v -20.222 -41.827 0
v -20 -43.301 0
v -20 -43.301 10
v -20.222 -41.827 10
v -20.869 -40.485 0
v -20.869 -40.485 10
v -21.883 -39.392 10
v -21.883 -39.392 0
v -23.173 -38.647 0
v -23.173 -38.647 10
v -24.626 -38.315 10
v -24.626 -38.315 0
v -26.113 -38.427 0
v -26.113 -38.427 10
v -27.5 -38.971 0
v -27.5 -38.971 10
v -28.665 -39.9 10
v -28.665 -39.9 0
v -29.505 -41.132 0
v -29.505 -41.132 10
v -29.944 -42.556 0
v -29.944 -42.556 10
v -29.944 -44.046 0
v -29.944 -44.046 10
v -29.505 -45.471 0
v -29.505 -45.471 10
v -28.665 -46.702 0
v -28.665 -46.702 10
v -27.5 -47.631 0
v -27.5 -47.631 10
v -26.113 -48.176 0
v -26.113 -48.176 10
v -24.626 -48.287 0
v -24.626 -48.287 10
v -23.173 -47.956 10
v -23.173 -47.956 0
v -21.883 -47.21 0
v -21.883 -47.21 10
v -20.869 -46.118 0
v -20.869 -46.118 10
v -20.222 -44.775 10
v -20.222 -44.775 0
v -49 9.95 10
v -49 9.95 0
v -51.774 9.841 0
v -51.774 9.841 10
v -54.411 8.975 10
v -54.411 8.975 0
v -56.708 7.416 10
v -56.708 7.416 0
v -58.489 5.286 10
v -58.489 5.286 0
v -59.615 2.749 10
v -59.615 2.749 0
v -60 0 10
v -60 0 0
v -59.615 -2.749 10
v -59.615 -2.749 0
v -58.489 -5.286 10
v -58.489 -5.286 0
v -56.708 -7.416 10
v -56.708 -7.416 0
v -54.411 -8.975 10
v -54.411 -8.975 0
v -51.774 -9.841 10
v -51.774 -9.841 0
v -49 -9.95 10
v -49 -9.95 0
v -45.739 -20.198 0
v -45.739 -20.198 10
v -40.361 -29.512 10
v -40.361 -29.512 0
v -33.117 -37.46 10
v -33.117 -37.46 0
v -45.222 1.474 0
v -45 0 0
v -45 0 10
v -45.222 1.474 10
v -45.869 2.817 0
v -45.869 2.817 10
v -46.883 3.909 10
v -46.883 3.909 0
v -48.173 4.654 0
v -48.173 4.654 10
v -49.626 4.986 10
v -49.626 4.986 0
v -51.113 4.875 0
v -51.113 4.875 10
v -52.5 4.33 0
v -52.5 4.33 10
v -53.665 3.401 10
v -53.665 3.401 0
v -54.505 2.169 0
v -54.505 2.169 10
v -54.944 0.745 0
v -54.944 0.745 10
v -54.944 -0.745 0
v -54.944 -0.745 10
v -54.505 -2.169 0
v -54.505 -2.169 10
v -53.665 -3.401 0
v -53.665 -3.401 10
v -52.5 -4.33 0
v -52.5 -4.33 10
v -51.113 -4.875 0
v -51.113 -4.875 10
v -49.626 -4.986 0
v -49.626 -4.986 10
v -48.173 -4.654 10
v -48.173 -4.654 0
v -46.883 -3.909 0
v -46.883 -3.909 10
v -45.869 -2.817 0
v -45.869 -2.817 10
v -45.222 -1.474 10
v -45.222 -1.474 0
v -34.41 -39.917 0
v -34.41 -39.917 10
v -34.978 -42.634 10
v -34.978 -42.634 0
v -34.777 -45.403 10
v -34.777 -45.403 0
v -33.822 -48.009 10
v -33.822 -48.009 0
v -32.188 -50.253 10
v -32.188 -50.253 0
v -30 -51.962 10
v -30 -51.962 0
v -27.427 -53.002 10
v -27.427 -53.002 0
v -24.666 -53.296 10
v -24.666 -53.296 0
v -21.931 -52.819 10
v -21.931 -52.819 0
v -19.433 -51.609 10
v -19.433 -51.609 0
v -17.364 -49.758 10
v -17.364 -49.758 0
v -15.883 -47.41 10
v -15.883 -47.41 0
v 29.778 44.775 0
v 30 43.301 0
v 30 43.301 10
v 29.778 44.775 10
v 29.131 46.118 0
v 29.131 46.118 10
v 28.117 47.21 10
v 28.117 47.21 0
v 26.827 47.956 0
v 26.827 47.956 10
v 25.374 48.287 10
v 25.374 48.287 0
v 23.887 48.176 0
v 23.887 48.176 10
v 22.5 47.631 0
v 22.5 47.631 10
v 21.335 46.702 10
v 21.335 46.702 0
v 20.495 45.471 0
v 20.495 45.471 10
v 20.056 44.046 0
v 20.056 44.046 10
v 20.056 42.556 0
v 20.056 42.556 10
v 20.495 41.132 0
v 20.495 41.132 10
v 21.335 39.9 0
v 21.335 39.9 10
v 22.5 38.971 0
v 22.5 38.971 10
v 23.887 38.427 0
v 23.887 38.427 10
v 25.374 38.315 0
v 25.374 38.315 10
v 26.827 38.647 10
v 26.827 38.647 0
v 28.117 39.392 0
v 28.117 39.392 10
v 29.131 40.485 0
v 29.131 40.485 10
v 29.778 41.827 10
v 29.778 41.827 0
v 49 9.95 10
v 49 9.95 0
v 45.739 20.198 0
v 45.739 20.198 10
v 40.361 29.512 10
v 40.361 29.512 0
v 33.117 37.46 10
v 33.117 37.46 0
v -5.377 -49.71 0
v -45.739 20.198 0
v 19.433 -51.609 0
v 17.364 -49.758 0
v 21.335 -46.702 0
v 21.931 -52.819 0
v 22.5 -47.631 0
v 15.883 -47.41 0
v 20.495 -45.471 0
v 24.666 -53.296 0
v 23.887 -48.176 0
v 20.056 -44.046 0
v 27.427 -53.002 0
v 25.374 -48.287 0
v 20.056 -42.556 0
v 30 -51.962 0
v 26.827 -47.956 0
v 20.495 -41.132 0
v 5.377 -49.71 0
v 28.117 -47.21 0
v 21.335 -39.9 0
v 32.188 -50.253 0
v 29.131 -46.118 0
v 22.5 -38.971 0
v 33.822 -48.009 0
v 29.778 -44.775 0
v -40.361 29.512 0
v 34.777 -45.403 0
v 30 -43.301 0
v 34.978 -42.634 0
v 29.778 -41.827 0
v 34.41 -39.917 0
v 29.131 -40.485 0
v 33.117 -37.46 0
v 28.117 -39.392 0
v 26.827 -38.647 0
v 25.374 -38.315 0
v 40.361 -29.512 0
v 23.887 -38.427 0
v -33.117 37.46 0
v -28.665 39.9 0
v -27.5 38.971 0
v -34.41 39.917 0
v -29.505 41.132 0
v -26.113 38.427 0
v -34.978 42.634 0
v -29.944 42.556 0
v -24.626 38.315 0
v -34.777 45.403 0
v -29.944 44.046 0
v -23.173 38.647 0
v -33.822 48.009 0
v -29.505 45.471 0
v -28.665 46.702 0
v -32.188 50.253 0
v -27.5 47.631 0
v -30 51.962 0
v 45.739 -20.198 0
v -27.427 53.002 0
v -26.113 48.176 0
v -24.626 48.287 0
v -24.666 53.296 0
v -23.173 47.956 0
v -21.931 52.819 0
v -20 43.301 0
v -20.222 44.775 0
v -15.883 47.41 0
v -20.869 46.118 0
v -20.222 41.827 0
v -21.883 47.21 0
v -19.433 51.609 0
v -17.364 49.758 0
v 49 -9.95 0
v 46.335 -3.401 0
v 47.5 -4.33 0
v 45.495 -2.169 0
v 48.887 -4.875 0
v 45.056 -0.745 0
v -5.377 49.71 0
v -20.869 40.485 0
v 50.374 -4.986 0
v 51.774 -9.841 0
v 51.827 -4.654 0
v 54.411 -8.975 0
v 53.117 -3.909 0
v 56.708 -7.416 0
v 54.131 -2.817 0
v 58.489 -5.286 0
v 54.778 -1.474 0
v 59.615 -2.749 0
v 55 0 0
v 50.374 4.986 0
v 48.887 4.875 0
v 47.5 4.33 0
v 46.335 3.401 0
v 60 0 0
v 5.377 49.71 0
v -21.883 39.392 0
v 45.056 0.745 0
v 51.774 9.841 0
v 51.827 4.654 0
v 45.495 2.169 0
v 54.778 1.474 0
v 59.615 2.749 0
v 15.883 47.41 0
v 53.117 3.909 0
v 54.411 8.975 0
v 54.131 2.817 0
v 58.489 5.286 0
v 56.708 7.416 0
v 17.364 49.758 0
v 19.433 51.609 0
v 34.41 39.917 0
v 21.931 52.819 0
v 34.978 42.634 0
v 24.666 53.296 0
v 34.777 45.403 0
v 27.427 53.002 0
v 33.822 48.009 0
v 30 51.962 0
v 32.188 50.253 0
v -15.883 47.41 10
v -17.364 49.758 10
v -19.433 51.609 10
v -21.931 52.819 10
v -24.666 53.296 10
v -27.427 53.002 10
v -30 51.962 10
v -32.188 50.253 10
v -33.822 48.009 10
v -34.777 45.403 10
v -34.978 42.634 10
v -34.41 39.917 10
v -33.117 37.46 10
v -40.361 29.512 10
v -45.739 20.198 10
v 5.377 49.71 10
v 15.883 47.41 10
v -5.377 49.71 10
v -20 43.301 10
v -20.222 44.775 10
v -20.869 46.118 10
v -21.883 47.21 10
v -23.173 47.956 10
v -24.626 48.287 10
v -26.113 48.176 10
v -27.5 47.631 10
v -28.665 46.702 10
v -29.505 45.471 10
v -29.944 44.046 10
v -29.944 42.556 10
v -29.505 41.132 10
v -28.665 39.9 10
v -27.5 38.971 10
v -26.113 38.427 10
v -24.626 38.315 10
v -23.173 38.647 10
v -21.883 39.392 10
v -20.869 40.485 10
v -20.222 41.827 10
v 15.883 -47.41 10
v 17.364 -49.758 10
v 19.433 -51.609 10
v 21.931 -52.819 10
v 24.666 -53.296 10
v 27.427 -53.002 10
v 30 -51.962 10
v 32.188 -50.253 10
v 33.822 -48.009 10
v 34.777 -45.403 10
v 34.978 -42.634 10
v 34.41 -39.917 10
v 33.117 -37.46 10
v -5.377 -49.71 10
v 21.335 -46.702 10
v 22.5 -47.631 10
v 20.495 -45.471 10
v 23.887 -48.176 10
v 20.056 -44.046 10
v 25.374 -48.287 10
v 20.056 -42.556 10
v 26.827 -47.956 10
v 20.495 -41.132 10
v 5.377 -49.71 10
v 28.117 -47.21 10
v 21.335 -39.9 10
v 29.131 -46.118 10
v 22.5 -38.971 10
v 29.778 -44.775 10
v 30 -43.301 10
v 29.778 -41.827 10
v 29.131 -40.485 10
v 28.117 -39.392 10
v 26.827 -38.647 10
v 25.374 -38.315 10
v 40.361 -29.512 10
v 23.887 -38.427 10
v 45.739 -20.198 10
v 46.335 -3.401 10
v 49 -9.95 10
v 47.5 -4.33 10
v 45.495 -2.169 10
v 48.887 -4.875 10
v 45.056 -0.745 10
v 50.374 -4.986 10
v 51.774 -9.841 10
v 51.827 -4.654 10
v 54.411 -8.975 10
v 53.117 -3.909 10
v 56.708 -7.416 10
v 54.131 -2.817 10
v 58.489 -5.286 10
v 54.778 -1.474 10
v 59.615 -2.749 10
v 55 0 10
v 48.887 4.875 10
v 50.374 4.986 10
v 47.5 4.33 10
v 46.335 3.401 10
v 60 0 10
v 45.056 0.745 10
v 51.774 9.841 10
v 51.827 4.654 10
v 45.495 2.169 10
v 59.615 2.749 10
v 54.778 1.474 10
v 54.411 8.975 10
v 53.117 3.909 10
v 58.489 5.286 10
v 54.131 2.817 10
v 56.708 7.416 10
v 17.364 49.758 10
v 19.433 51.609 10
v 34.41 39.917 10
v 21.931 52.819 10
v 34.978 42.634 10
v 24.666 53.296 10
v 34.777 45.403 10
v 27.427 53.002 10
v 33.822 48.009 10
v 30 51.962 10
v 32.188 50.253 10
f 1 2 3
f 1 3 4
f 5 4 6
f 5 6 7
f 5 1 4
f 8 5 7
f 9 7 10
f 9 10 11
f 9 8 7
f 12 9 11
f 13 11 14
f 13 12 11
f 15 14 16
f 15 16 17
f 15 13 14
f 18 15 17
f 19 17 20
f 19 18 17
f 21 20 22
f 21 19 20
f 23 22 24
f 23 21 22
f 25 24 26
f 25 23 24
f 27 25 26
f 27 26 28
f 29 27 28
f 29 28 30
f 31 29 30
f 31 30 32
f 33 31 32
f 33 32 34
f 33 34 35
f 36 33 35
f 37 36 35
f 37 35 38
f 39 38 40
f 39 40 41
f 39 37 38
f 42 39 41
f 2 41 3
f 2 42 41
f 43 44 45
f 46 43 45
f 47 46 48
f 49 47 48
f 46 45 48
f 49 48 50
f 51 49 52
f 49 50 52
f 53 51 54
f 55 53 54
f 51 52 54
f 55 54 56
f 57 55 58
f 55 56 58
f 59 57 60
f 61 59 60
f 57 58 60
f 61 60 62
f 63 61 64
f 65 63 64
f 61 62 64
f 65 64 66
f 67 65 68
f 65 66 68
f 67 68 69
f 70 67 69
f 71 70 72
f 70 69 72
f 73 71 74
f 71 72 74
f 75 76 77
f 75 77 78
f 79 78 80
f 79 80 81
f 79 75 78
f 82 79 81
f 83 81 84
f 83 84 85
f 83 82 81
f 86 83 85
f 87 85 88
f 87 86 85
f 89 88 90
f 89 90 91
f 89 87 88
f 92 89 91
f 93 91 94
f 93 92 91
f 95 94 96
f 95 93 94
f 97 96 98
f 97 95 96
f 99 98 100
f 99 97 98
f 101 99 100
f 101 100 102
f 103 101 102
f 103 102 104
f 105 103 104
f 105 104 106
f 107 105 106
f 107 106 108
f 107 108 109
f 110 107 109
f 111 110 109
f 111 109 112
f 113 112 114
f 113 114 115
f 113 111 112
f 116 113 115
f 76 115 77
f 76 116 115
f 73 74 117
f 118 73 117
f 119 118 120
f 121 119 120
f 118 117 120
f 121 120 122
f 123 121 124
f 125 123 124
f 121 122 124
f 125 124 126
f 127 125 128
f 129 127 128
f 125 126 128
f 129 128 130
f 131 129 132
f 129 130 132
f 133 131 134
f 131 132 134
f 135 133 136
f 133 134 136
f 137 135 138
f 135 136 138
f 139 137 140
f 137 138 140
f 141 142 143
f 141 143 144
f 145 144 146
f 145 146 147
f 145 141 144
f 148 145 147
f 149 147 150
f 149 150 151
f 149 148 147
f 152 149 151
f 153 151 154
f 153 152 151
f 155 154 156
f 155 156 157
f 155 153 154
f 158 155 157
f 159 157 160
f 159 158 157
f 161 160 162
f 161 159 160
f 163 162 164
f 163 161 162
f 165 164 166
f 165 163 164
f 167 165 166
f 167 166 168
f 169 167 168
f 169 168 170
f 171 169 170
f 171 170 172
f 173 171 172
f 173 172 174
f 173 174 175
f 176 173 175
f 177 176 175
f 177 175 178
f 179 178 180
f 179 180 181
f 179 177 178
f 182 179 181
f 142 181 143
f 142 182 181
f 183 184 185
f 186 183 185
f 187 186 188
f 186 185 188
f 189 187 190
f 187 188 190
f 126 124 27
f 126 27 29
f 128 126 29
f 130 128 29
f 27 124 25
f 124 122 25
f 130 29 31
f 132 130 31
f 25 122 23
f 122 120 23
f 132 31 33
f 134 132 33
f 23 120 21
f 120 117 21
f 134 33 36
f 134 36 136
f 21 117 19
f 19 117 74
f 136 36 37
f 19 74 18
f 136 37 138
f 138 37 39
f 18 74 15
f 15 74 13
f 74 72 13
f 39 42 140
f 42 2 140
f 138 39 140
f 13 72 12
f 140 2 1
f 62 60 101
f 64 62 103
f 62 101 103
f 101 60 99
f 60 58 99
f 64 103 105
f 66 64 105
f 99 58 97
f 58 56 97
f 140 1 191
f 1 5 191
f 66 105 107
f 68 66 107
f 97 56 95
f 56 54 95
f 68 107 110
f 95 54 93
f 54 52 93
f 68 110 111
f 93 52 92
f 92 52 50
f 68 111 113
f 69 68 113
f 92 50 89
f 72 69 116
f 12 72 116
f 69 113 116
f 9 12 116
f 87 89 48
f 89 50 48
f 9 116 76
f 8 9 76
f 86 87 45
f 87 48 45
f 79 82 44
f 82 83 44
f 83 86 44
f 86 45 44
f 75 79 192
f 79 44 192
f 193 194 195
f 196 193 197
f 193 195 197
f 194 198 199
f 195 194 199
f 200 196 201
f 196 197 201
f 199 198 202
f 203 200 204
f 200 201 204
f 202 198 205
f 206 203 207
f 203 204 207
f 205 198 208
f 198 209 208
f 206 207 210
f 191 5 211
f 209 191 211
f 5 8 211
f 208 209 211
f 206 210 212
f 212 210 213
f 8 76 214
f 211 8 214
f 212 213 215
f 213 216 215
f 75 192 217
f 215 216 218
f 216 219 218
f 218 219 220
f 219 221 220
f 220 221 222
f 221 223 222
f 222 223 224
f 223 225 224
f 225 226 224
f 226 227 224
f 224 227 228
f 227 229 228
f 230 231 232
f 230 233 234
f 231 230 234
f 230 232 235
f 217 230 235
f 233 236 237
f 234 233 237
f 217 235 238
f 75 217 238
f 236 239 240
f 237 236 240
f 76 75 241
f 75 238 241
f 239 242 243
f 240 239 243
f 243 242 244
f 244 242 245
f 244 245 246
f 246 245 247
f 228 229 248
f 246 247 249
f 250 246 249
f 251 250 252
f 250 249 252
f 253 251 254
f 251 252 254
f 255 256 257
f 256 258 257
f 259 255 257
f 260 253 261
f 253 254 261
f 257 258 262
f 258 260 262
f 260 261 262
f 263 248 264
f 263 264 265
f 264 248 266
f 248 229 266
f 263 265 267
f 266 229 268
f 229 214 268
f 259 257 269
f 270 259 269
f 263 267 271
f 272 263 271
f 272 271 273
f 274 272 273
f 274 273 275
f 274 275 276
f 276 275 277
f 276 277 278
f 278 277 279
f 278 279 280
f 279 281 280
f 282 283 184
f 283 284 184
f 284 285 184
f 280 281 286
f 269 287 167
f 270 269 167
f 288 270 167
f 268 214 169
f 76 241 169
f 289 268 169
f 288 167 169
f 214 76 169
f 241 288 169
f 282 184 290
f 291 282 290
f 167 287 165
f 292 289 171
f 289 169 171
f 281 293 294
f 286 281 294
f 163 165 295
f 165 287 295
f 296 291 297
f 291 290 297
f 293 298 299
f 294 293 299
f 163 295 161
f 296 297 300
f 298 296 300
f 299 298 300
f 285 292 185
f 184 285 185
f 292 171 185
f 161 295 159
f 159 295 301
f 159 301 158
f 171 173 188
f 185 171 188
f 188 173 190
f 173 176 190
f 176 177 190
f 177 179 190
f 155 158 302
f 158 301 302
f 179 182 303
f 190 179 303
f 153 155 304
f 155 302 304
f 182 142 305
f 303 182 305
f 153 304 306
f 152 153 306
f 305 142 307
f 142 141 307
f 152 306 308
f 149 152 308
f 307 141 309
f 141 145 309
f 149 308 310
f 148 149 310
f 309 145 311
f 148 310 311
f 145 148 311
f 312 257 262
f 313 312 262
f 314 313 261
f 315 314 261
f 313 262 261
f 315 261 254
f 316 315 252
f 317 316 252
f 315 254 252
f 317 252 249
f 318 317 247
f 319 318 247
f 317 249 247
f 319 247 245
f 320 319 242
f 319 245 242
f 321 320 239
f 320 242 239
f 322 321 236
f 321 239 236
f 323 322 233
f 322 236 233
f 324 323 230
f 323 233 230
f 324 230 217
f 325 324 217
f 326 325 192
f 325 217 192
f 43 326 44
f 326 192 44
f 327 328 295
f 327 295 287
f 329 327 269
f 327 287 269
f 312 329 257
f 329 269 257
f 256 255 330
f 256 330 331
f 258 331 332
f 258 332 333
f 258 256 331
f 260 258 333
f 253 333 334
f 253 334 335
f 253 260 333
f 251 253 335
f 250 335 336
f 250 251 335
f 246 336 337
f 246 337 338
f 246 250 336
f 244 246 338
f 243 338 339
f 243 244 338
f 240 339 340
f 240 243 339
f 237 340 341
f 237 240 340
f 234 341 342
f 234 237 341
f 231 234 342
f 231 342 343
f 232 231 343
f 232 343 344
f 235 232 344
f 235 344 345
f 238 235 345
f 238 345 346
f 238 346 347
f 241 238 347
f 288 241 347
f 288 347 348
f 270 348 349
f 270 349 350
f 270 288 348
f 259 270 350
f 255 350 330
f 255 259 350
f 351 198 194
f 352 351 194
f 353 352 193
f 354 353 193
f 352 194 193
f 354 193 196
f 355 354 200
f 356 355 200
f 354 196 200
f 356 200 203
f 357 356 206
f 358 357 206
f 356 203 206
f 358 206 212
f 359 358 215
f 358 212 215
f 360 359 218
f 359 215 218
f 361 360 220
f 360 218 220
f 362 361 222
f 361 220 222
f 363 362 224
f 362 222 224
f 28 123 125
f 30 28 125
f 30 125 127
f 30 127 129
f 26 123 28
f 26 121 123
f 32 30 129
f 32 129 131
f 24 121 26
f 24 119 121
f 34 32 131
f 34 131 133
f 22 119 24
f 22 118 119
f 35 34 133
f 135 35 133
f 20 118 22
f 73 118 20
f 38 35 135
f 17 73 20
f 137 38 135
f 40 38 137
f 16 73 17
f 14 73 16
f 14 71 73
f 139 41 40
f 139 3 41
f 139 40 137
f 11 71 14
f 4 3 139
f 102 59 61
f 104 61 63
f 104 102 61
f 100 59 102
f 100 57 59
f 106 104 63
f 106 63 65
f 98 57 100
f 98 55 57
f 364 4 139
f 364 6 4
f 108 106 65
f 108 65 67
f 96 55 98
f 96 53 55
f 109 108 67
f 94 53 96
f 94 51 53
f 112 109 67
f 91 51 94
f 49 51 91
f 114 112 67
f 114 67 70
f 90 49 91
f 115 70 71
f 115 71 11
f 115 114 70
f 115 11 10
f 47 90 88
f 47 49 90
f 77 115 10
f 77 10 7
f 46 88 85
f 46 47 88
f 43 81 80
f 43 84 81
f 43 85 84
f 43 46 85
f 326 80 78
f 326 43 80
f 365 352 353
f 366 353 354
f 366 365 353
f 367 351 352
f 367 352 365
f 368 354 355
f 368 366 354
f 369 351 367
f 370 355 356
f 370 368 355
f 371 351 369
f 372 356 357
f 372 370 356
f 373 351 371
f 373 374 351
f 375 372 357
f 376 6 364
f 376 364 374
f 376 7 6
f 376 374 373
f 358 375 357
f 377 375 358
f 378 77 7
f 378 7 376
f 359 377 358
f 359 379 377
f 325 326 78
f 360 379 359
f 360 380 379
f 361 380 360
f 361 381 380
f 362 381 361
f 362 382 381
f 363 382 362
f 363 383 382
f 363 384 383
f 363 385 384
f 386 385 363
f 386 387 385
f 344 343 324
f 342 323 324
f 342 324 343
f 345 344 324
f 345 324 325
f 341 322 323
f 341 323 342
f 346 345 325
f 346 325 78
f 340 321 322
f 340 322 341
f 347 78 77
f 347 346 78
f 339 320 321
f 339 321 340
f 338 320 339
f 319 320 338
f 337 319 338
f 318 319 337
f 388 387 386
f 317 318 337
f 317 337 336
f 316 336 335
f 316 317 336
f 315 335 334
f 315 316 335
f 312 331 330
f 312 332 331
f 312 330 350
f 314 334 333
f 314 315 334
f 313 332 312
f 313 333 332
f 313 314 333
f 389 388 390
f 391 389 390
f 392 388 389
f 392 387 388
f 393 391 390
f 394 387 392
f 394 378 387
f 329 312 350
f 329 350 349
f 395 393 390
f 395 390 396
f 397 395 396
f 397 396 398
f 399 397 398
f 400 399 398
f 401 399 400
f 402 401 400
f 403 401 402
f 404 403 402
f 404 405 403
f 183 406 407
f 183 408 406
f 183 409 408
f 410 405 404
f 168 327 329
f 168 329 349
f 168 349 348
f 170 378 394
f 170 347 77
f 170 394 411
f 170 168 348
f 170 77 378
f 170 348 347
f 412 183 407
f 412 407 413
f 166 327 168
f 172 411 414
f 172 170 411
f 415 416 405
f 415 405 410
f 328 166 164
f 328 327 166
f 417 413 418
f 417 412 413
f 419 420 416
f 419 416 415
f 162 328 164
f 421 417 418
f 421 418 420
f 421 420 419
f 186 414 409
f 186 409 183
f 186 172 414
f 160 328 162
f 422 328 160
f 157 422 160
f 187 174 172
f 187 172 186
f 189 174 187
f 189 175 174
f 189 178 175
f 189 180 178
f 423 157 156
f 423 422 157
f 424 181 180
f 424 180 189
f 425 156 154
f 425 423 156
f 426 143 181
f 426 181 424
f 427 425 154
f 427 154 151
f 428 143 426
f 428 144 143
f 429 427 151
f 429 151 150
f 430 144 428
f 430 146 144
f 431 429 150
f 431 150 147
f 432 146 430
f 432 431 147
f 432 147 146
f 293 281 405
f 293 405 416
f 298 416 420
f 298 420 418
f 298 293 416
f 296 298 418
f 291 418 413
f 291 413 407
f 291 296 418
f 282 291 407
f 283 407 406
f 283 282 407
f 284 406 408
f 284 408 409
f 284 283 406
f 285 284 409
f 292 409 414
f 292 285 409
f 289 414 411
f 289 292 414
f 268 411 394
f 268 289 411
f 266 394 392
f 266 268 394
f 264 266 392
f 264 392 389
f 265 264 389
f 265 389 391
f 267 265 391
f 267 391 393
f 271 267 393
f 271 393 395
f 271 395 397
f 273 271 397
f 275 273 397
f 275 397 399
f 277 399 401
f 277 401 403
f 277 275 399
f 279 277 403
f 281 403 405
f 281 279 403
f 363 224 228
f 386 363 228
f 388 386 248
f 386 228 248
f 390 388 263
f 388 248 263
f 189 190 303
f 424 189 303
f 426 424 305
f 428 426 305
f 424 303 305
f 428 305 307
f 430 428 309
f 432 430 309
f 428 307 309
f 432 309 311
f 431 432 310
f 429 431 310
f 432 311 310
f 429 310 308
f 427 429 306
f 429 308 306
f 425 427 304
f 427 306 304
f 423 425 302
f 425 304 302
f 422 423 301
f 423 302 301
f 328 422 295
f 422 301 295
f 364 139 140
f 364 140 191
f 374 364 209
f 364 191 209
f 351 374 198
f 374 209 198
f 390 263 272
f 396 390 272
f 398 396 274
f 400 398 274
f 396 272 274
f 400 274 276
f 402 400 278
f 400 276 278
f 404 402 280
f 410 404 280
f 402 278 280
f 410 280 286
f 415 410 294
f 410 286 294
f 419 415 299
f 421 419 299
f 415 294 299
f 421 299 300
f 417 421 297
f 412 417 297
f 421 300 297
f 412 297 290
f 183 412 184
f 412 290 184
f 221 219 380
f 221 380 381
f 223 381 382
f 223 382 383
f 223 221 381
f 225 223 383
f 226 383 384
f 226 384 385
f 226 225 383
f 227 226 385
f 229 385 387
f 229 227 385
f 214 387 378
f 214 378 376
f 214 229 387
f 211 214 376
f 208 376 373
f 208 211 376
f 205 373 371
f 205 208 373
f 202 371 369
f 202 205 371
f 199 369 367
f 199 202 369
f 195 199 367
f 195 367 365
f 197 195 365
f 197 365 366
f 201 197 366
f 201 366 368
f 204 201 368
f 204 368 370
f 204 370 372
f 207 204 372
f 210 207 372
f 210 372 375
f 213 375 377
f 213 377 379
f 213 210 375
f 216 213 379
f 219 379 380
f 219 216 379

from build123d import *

# Parameters (mm, degrees)
SKETCH2_R           = 5
BOSS_EXTRUDE1_DEPTH = 10


with BuildPart() as part:
    # Sketch2 → Boss-Extrude1 (new body)
    with BuildSketch(Plane.XY):
        with BuildLine():
            ThreePointArc((49, 9.949874371), (43.301270189, 25), (33.11684397, 37.4603076))
            ThreePointArc((33.11684397, 37.4603076), (30, 51.961524227), (15.88315603, 47.410181971))
            ThreePointArc((15.88315603, 47.410181971), (0, 50), (-15.88315603, 47.410181971))
            ThreePointArc((-15.88315603, 47.410181971), (-30, 51.961524227), (-33.11684397, 37.4603076))
            ThreePointArc((-33.11684397, 37.4603076), (-43.301270189, 25), (-49, 9.949874371))
            ThreePointArc((-49, 9.949874371), (-60, 0), (-49, -9.949874371))
            ThreePointArc((-49, -9.949874371), (-43.301270189, -25), (-33.11684397, -37.4603076))
            ThreePointArc((-33.11684397, -37.4603076), (-30, -51.961524227), (-15.88315603, -47.410181971))
            ThreePointArc((-15.88315603, -47.410181971), (0, -50), (15.88315603, -47.410181971))
            ThreePointArc((15.88315603, -47.410181971), (30, -51.961524227), (33.11684397, -37.4603076))
            ThreePointArc((33.11684397, -37.4603076), (43.301270189, -25), (49, -9.949874371))
            ThreePointArc((49, -9.949874371), (60, 0), (49, 9.949874371))
        make_face()
        with Locations((50, 0)):
            Circle(SKETCH2_R, mode=Mode.SUBTRACT)
        with Locations((25, -43.301270189)):
            Circle(SKETCH2_R, mode=Mode.SUBTRACT)
        with Locations((-25, -43.301270189)):
            Circle(SKETCH2_R, mode=Mode.SUBTRACT)
        with Locations((-50, 0)):
            Circle(SKETCH2_R, mode=Mode.SUBTRACT)
        with Locations((-25, 43.301270189)):
            Circle(SKETCH2_R, mode=Mode.SUBTRACT)
        with Locations((25, 43.301270189)):
            Circle(SKETCH2_R, mode=Mode.SUBTRACT)
    extrude(amount=BOSS_EXTRUDE1_DEPTH)


solid = part.part
